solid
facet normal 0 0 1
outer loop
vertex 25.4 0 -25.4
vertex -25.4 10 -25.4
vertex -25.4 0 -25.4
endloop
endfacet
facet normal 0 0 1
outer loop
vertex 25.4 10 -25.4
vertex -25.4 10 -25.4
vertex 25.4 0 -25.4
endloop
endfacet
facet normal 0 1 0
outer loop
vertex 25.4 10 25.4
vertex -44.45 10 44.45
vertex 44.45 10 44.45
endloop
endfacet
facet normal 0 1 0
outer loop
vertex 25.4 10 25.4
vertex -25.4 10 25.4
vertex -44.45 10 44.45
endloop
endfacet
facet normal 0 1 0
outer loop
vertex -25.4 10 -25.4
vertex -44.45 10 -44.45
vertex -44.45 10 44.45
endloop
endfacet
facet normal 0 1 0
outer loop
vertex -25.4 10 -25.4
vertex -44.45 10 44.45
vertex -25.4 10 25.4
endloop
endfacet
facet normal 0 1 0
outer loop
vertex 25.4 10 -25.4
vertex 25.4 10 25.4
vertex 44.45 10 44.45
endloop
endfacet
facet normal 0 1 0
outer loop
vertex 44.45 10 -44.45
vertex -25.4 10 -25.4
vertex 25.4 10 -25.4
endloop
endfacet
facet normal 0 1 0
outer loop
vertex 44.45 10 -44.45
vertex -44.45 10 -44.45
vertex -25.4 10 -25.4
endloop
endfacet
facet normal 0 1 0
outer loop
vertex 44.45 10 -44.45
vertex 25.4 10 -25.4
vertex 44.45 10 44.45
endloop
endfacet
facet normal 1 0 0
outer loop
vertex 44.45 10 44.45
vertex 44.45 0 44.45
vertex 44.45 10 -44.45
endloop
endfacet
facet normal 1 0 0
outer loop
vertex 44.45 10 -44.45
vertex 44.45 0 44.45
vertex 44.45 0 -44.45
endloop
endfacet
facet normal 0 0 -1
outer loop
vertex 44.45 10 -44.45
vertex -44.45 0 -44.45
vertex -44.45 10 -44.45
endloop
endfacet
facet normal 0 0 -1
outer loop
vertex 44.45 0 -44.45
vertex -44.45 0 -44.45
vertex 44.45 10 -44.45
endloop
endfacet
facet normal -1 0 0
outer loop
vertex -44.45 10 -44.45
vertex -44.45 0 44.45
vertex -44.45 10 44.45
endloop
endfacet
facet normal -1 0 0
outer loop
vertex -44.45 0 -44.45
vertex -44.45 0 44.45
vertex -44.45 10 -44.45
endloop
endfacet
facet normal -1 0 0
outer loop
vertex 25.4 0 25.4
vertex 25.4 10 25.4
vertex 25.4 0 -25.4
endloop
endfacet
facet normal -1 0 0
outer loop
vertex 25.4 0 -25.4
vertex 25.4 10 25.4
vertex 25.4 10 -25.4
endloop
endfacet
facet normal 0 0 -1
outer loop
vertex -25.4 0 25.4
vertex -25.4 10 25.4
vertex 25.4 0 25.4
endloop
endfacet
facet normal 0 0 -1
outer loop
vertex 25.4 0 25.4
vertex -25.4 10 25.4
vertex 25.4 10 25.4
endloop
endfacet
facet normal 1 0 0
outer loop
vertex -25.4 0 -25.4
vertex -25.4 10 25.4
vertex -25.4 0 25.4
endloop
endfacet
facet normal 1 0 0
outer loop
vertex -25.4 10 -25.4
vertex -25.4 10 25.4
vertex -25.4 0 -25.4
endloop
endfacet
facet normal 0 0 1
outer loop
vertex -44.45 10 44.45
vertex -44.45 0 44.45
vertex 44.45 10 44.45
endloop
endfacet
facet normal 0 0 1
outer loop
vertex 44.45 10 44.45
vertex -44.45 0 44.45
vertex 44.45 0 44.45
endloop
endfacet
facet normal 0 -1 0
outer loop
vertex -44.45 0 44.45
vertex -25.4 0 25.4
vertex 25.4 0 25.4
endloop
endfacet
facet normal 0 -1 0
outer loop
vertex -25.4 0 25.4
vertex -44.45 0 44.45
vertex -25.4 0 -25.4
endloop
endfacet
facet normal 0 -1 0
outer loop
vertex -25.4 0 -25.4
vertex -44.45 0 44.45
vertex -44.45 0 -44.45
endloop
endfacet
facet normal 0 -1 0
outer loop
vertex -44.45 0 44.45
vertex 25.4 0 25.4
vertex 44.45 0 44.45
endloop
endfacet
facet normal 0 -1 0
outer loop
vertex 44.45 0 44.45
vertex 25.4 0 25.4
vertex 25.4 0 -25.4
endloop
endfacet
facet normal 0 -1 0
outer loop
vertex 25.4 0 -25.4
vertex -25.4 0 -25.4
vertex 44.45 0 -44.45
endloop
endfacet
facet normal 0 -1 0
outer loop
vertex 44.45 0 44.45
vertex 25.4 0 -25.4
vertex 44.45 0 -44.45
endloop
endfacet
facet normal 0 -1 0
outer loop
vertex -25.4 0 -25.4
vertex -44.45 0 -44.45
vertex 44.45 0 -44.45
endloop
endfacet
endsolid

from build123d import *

# Parameters (mm, degrees)
SKETCH1_W           = 88.9
SKETCH1_H           = 88.9
BOSS_EXTRUDE1_DEPTH = 10
CUT_EXTRUDE1_REACH  = 12
SKETCH2_W           = 50.8
SKETCH2_H           = 50.8


with BuildPart() as part:
    # Sketch1 → Boss-Extrude1 (new body)
    with BuildSketch(Plane(origin=(0, 0, 0), x_dir=(1, 0, 0), z_dir=(0, 1, 0))):
        Rectangle(SKETCH1_W, SKETCH1_H)
    extrude(amount=BOSS_EXTRUDE1_DEPTH)

    # Sketch2 → Cut-Extrude1 (cut, up to next)
    with BuildSketch(Plane(origin=(0, 10, 0), x_dir=(1, 0, 0), z_dir=(0, 1, 0)), mode=Mode.PRIVATE) as cut_extrude1_sk1:
        Rectangle(SKETCH2_W, SKETCH2_H)
    cut_extrude1_tool1 = extrude(cut_extrude1_sk1.sketch, amount=-CUT_EXTRUDE1_REACH, mode=Mode.PRIVATE) & part.part
    add(cut_extrude1_tool1.solids().sort_by_distance((0, 10, 0))[0], mode=Mode.SUBTRACT)


solid = part.part
